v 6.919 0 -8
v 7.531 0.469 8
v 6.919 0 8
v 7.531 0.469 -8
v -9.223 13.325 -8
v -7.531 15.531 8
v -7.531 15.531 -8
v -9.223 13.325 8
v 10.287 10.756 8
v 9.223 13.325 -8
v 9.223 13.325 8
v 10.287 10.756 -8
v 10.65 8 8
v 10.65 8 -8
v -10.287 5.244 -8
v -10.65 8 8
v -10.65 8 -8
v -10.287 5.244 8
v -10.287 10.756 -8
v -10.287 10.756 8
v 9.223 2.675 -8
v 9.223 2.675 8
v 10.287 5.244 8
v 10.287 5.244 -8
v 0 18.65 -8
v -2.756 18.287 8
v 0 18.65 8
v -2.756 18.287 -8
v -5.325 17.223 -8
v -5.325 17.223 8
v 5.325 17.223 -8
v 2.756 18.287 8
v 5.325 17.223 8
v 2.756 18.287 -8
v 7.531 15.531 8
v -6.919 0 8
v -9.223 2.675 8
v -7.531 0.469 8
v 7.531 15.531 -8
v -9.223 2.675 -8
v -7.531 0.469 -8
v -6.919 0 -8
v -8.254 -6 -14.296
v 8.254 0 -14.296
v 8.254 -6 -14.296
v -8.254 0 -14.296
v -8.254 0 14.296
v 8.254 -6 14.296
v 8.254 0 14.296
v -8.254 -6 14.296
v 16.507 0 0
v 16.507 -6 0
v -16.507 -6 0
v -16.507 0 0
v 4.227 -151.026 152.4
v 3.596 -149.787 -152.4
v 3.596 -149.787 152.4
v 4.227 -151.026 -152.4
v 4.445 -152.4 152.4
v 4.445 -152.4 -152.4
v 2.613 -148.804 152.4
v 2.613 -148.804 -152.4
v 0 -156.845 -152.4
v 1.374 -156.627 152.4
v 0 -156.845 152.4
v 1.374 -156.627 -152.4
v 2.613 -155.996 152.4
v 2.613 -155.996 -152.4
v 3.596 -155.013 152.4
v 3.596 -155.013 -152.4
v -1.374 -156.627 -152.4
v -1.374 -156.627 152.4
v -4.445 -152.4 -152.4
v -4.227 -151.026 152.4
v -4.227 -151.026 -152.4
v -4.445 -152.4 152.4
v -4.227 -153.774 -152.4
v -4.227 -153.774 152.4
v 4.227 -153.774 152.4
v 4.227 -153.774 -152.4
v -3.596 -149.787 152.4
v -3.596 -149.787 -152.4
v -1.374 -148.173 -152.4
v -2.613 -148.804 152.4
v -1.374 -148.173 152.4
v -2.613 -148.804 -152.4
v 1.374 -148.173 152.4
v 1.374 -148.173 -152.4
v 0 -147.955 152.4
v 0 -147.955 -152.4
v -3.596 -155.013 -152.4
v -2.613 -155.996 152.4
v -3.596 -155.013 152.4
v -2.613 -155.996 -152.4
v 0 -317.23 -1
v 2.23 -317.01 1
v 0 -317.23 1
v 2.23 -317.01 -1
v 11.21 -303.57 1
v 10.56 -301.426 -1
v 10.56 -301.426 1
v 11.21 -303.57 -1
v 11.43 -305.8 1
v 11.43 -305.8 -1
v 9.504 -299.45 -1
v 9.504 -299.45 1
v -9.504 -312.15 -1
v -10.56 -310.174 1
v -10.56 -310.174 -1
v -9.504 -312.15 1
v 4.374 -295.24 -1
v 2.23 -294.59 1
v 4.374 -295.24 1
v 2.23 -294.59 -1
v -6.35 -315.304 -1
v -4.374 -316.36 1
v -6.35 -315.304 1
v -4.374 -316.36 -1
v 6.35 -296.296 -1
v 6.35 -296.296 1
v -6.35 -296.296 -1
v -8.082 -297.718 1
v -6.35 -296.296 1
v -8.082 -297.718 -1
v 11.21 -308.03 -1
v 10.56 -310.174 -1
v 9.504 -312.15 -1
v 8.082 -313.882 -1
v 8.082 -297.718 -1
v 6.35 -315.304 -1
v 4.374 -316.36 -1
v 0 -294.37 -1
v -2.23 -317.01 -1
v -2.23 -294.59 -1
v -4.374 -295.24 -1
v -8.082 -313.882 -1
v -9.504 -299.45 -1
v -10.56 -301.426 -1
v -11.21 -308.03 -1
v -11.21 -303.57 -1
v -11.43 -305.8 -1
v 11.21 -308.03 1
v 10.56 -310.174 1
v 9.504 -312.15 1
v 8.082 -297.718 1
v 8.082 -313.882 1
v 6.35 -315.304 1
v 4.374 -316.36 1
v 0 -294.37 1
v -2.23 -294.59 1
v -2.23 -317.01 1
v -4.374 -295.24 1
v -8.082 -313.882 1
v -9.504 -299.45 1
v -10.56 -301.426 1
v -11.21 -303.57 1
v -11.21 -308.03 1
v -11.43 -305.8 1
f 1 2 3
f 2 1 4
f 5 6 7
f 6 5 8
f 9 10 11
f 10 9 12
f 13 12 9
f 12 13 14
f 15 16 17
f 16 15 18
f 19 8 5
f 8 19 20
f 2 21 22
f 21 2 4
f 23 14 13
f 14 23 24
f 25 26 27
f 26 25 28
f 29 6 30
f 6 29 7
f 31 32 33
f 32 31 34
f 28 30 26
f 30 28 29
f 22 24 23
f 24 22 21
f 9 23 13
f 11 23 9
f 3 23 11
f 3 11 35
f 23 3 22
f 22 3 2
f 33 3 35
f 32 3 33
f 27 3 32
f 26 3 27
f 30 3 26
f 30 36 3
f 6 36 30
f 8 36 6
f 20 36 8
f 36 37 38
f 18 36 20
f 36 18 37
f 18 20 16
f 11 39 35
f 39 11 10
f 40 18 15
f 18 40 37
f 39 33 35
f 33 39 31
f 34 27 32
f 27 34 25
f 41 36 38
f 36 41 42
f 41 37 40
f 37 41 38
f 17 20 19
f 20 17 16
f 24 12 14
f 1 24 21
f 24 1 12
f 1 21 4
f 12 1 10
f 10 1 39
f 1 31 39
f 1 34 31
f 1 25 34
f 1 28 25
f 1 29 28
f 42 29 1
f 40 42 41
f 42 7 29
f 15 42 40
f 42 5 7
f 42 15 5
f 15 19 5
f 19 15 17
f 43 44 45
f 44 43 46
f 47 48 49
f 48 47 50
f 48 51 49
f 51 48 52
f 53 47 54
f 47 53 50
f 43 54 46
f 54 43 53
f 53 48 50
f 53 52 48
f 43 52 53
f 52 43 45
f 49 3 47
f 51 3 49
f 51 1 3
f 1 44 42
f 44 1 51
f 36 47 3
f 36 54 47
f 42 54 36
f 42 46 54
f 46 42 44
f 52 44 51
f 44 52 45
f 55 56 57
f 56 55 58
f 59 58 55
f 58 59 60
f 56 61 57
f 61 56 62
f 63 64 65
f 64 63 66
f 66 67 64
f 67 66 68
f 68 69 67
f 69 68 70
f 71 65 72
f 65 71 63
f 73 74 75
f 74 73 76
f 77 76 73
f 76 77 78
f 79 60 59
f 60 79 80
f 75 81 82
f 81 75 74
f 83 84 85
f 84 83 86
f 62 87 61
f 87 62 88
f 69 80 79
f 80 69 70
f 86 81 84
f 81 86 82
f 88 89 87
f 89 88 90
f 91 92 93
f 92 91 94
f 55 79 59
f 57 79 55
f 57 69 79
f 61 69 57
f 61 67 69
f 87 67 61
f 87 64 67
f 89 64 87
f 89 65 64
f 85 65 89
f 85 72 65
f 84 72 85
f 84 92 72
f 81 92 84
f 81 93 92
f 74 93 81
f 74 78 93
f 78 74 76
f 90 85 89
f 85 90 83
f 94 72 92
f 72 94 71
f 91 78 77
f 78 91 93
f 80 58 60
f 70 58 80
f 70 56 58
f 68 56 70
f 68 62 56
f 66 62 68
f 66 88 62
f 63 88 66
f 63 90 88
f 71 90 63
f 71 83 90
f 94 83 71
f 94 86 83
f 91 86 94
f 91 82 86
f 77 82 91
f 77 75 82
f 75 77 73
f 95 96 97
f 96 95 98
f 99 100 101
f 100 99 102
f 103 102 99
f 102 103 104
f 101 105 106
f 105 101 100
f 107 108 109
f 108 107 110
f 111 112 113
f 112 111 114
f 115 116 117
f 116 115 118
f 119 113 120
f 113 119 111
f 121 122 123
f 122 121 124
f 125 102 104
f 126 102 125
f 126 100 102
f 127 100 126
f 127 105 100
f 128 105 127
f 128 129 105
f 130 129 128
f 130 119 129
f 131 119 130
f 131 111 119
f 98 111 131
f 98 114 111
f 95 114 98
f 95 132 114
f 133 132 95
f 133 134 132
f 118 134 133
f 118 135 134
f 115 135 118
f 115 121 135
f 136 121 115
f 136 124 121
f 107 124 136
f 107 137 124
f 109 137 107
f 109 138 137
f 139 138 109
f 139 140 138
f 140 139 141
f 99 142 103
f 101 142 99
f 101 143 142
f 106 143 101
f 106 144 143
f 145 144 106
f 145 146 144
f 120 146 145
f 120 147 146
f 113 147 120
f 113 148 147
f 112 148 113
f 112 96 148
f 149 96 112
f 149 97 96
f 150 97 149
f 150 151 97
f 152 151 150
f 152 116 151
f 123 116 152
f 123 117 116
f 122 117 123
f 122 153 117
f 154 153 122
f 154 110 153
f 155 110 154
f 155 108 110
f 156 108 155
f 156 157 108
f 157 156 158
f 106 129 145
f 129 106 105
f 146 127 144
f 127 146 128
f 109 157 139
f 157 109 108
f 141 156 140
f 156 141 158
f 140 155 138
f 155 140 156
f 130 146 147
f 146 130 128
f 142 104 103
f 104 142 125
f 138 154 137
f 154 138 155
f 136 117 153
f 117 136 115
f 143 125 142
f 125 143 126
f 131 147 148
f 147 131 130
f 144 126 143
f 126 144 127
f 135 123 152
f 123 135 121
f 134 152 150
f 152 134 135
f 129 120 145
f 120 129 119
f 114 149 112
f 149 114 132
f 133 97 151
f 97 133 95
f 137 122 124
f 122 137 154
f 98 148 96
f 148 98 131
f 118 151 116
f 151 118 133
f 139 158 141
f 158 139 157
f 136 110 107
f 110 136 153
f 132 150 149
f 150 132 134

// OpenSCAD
// Auto-generated by scripts/author_from_manifest.py (Phase D.3).
// Source: data/phase_d_manifest.json (sku_intent='tyco-ty3596-dry-pendent-155f').
// Do not hand-edit — regenerate from the manifest.
//
// @part tyco_ty3596_dry_pendent_155f
// @kind sprinkler_head
// @category head.pendant.k56
// @display-name "Tyco TY3596 Dry Pendent K5.6 155°F"
// @mfg tyco_fire_protection
// @mfg-pn TY3596
// @listing UL FM
// @hazard-classes LH OH1
// @price-usd 82.00
// @install-minutes 14
// @crew journeyman
// @k-factor 5.6
// @orientation pendant
// @response standard
// @temperature 155F
// @param size_in number default=0.5 label="Size" unit="in"
// @port inlet position=[0,0.014,0] direction=[0,1,0] style=NPT_threaded size_in=0.5 role=drop

size_in = 0.5;
k_factor = 5.6;

length_mm   = 304.80;
body_dia_mm = 25.40;
thread_od   = 21.3;
thread_len  = 16;
deflector_d = body_dia_mm * 0.9;

 union() {
    translate([0, thread_len/2, 0])
        cylinder(h = thread_len, d = thread_od, center = true, $fn = 24);
    translate([0, -3, 0])
        rotate([90, 0, 0])
        cylinder(h = 6, d = thread_od * 1.55, $fn = 6, center = true);
    translate([0, -length_mm/2, 0])
        cylinder(h = length_mm, d = body_dia_mm * 0.35, center = true, $fn = 20);
    translate([0, -length_mm - 1, 0])
        cylinder(h = 2, d = deflector_d, center = true, $fn = 32);
}
